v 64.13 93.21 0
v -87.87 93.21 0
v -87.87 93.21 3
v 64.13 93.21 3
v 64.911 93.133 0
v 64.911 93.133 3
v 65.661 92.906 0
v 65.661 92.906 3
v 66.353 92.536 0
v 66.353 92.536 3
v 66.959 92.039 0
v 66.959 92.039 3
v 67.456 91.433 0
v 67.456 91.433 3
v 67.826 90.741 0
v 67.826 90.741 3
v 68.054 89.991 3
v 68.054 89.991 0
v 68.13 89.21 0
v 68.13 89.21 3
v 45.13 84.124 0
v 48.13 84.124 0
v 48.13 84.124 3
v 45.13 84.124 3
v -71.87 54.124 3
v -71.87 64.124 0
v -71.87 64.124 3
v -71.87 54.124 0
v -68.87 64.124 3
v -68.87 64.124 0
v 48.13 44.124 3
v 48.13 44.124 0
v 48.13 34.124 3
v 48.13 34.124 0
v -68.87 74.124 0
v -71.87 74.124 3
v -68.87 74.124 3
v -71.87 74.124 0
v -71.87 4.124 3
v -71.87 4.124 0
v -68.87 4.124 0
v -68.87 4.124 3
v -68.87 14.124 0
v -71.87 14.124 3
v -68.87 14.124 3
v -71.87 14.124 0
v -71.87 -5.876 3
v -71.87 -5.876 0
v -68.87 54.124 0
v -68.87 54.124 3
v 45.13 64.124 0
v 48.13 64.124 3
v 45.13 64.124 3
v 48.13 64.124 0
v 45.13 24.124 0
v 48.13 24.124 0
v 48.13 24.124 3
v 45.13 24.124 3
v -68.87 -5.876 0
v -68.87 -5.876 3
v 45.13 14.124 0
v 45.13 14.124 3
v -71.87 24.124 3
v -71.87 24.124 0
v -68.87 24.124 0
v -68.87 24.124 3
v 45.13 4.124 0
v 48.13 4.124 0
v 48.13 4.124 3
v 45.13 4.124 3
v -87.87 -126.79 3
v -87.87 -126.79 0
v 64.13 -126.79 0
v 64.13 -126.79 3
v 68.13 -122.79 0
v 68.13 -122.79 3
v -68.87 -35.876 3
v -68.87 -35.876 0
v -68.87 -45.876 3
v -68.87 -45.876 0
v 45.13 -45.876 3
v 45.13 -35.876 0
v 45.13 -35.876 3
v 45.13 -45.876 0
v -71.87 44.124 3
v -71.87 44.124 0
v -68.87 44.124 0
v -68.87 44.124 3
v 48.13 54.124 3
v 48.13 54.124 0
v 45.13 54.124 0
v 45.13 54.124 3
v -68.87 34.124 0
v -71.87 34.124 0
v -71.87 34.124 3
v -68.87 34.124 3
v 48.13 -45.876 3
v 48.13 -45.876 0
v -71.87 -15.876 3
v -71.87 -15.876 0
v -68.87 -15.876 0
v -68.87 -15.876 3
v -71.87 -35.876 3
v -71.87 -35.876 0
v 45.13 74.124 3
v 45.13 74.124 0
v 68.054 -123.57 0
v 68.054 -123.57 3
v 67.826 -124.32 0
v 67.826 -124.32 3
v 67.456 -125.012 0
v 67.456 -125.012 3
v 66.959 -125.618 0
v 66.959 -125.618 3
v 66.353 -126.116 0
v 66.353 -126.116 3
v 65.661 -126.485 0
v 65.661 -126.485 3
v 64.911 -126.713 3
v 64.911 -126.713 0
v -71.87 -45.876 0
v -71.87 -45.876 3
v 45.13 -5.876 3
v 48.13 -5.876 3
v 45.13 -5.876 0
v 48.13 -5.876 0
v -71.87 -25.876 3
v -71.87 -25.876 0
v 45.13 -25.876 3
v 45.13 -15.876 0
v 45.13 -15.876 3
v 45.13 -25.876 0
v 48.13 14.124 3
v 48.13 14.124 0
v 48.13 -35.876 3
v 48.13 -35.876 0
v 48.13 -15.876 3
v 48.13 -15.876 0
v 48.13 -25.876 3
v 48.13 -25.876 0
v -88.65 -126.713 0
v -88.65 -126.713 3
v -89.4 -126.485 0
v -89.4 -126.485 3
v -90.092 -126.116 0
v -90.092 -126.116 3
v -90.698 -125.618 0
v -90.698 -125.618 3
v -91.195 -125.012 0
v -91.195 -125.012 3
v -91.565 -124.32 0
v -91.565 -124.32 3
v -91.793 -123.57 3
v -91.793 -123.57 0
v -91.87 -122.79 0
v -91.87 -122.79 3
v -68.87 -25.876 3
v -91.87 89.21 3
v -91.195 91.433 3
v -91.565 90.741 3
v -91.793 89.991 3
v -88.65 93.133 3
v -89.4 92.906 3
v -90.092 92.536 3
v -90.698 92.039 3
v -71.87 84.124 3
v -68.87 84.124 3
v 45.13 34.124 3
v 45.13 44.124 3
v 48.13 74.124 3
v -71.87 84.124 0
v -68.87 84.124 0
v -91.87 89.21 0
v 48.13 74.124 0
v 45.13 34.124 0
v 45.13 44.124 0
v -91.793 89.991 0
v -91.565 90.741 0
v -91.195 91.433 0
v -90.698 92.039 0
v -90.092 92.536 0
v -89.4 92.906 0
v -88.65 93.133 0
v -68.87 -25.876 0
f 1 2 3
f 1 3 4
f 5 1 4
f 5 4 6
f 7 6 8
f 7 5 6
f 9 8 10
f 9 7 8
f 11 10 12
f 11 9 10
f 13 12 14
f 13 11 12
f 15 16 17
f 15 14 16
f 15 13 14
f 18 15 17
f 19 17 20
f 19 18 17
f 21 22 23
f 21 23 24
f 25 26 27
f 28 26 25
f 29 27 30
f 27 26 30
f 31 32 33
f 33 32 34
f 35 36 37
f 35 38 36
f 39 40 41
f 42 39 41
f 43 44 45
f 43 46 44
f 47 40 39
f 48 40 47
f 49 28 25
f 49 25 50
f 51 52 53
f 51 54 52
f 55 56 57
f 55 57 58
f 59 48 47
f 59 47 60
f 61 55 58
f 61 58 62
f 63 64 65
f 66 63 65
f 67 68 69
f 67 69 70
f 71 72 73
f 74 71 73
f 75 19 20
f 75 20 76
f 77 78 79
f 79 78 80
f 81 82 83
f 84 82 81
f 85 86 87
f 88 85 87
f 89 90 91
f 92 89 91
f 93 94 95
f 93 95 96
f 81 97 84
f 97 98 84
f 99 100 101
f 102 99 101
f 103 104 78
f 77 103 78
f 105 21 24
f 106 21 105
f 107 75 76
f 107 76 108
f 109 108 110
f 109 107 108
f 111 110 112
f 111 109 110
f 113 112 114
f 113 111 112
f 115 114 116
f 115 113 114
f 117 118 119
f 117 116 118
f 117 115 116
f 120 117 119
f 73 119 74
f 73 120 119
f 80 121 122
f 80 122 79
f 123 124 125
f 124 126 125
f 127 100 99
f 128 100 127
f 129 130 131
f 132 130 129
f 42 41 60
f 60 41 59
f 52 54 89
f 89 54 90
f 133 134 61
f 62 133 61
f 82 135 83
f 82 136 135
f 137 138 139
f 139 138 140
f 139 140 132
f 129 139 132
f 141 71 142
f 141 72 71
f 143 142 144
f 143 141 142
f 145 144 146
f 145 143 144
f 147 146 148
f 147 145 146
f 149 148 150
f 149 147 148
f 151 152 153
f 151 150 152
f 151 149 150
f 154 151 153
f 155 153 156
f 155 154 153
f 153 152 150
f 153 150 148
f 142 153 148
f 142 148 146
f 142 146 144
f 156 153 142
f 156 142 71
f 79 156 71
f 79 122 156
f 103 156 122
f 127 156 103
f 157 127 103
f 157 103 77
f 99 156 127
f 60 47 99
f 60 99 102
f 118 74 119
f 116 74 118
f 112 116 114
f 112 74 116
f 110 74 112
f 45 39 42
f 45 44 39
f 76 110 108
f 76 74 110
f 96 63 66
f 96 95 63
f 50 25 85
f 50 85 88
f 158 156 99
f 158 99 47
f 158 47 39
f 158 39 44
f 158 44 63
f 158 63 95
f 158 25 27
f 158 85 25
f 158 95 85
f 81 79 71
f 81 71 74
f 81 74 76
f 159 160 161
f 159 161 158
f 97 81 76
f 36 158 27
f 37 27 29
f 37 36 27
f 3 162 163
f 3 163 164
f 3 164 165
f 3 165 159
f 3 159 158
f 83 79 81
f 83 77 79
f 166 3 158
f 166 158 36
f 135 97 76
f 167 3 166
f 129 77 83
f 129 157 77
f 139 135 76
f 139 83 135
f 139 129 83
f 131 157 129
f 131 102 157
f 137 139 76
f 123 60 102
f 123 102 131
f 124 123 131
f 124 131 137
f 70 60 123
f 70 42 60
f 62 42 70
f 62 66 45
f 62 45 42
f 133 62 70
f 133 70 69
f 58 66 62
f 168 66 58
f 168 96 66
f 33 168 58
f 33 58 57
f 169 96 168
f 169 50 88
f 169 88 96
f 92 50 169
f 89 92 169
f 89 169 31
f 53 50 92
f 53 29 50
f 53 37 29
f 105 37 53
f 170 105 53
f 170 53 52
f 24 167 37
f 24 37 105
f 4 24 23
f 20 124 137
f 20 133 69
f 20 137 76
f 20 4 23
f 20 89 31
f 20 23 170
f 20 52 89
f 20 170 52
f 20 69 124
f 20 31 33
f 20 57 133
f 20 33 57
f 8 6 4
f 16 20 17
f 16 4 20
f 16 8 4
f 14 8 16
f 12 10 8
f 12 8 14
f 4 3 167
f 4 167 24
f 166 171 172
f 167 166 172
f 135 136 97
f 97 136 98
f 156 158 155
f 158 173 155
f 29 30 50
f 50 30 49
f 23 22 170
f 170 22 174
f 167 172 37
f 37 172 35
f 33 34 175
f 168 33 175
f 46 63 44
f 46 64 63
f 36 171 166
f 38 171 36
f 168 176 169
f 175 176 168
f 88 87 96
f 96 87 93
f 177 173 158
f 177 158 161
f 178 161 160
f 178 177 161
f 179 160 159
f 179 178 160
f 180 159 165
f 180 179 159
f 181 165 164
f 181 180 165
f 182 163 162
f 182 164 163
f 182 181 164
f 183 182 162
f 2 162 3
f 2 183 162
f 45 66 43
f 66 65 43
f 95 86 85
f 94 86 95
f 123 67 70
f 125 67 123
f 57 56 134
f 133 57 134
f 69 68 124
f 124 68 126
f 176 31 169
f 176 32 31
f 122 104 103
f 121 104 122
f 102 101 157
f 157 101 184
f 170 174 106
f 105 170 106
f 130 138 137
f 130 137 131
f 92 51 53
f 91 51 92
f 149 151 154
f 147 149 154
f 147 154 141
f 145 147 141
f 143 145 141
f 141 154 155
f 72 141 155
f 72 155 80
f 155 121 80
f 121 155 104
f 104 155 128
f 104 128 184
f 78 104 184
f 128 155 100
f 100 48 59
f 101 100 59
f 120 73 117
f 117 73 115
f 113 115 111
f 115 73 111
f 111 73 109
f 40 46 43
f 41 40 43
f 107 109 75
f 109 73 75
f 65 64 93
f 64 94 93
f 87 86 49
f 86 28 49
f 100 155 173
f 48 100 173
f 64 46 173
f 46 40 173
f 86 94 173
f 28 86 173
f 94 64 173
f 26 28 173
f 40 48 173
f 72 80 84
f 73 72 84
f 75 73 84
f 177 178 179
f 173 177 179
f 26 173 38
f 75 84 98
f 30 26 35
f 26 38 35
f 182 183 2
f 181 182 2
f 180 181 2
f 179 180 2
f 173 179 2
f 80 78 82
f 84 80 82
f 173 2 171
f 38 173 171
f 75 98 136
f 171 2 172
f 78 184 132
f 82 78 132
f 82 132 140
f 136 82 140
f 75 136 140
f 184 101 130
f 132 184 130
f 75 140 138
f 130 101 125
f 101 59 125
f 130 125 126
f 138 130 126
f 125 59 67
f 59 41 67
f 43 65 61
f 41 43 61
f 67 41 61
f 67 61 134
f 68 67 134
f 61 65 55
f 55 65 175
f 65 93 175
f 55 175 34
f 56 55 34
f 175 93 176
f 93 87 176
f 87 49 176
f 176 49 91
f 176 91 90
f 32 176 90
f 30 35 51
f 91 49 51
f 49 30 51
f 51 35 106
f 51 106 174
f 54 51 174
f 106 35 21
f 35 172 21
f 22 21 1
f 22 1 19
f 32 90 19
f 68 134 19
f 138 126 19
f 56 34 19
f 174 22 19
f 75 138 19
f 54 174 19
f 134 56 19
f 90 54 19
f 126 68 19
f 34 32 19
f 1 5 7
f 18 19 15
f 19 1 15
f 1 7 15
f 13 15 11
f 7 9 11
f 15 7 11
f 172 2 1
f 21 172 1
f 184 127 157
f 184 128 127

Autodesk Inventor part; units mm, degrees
ref_plane "YZ Plane" through (0, 0, 0) normal (1, 0, 0) x (0, 1, 0)
ref_plane "XZ Plane" through (0, 0, 0) normal (0, 1, 0) x (-1, 0, 0)
ref_plane "XY Plane" through (0, 0, 0) normal (0, 0, 1) x (1, 0, 0)
sketch "Esquisse1" plane through (0, 0, 0) normal (0, 0, 1) x (1, 0, 0)
  line L0 (-91.8695, 89.2103) -> (-91.8695, -122.7897)
  line L1 (-68.8695, 44.1244) -> (-68.8695, 34.1244)
  line L2 (-71.8695, 44.1244) -> (-71.8695, 34.1244)
  line L3 (-71.8695, 24.1244) -> (-71.8695, 14.1244)
  line L4 (-68.8695, 24.1244) -> (-68.8695, 14.1244)
  line L5 (-68.8695, 4.1244) -> (-68.8695, -5.8756)
  line L6 (-71.8695, 4.1244) -> (-71.8695, -5.8756)
  line L7 (-71.8695, 34.1244) -> (-68.8695, 34.1244)
  line L8 (-71.8695, -15.8756) -> (-68.8695, -15.8756)
  line L9 (-71.8695, 24.1244) -> (-68.8695, 24.1244)
  line L10 (-71.8695, 44.1244) -> (-68.8695, 44.1244)
  line L11 (-71.8695, -25.8756) -> (-68.8695, -25.8756)
  line L12 (-71.8695, -5.8756) -> (-68.8695, -5.8756)
  line L13 (-71.8695, 64.1244) -> (-68.8695, 64.1244)
  line L14 (-68.8695, 84.1244) -> (-68.8695, 74.1244)
  line L15 (-71.8695, 84.1244) -> (-71.8695, 74.1244)
  line L16 (-71.8695, 84.1244) -> (-68.8695, 84.1244)
  line L17 (-71.8695, 74.1244) -> (-68.8695, 74.1244)
  line L18 (-68.8695, 64.1244) -> (-68.8695, 54.1244)
  line L19 (-71.8695, 64.1244) -> (-71.8695, 54.1244)
  line L20 (48.1305, -5.8756) -> (45.1305, -5.8756)
  line L21 (-87.8695, 93.2103) -> (64.1305, 93.2103)
  line L22 (68.1305, 89.2103) -> (68.1305, -122.7897)
  line L23 (48.1305, 4.1244) -> (48.1305, -5.8756)
  line L24 (45.1305, 4.1244) -> (45.1305, -5.8756)
  line L25 (48.1305, 4.1244) -> (45.1305, 4.1244)
  line L26 (48.1305, 14.1244) -> (45.1305, 14.1244)
  line L27 (45.1305, 24.1244) -> (45.1305, 14.1244)
  line L28 (48.1305, 24.1244) -> (48.1305, 14.1244)
  line L29 (48.1305, 24.1244) -> (45.1305, 24.1244)
  line L30 (45.1305, 44.1244) -> (45.1305, 34.1244)
  line L31 (48.1305, 44.1244) -> (45.1305, 44.1244)
  line L32 (48.1305, 44.1244) -> (48.1305, 34.1244)
  line L33 (48.1305, 54.1244) -> (45.1305, 54.1244)
  line L34 (45.1305, 64.1244) -> (45.1305, 54.1244)
  line L35 (48.1305, 64.1244) -> (45.1305, 64.1244)
  line L36 (48.1305, 64.1244) -> (48.1305, 54.1244)
  line L37 (48.1305, 74.1244) -> (45.1305, 74.1244)
  line L38 (45.1305, 84.1244) -> (45.1305, 74.1244)
  line L39 (48.1305, 84.1244) -> (45.1305, 84.1244)
  line L40 (48.1305, 84.1244) -> (48.1305, 74.1244)
  line L41 (48.1305, 34.1244) -> (45.1305, 34.1244)
  line L42 (-71.8695, -15.8756) -> (-71.8695, -25.8756)
  line L43 (-68.8695, -15.8756) -> (-68.8695, -25.8756)
  line L44 (-68.8695, -35.8756) -> (-68.8695, -45.8756)
  line L45 (48.1305, -15.8756) -> (45.1305, -15.8756)
  line L46 (45.1305, -15.8756) -> (45.1305, -25.8756)
  line L47 (48.1305, -15.8756) -> (48.1305, -25.8756)
  line L48 (48.1305, -25.8756) -> (45.1305, -25.8756)
  line L49 (48.1305, -35.8756) -> (45.1305, -35.8756)
  line L50 (48.1305, -35.8756) -> (48.1305, -45.8756)
  line L51 (48.1305, -45.8756) -> (45.1305, -45.8756)
  line L52 (-87.8695, -126.7897) -> (64.1305, -126.7897)
  line L53 (-71.8695, -35.8756) -> (-68.8695, -35.8756)
  line L54 (-71.8695, -35.8756) -> (-71.8695, -45.8756)
  line L55 (-71.8695, -45.8756) -> (-68.8695, -45.8756)
  line L56 (45.1305, -35.8756) -> (45.1305, -45.8756)
  line L57 (-71.8695, 14.1244) -> (-68.8695, 14.1244)
  line L58 (-71.8695, 54.1244) -> (-68.8695, 54.1244)
  line L59 (-71.8695, 4.1244) -> (-68.8695, 4.1244)
  arc A0 (-87.8695, 93.2103) -> (-91.8695, 89.2103) centre (-87.8695, 89.2103) ccw
  arc A1 (68.1305, 89.2103) -> (64.1305, 93.2103) centre (64.1305, 89.2103) ccw
  arc A2 (64.1305, -126.7897) -> (68.1305, -122.7897) centre (64.1305, -122.7897) ccw
  arc A3 (-91.8695, -122.7897) -> (-87.8695, -126.7897) centre (-87.8695, -122.7897) ccw
  point P0 (0, 0)
  point P1 (-91.8695, 93.2103)
  point P2 (-91.8695, -126.7897)
  point P3 (68.1305, 93.2103)
  point P4 (68.1305, -126.7897)
  dimension "d3" = 220
  dimension "d5" = 4
extrude "Extrusion1" add sketch "Esquisse1" along normal blind 3
properties part number "toit"
